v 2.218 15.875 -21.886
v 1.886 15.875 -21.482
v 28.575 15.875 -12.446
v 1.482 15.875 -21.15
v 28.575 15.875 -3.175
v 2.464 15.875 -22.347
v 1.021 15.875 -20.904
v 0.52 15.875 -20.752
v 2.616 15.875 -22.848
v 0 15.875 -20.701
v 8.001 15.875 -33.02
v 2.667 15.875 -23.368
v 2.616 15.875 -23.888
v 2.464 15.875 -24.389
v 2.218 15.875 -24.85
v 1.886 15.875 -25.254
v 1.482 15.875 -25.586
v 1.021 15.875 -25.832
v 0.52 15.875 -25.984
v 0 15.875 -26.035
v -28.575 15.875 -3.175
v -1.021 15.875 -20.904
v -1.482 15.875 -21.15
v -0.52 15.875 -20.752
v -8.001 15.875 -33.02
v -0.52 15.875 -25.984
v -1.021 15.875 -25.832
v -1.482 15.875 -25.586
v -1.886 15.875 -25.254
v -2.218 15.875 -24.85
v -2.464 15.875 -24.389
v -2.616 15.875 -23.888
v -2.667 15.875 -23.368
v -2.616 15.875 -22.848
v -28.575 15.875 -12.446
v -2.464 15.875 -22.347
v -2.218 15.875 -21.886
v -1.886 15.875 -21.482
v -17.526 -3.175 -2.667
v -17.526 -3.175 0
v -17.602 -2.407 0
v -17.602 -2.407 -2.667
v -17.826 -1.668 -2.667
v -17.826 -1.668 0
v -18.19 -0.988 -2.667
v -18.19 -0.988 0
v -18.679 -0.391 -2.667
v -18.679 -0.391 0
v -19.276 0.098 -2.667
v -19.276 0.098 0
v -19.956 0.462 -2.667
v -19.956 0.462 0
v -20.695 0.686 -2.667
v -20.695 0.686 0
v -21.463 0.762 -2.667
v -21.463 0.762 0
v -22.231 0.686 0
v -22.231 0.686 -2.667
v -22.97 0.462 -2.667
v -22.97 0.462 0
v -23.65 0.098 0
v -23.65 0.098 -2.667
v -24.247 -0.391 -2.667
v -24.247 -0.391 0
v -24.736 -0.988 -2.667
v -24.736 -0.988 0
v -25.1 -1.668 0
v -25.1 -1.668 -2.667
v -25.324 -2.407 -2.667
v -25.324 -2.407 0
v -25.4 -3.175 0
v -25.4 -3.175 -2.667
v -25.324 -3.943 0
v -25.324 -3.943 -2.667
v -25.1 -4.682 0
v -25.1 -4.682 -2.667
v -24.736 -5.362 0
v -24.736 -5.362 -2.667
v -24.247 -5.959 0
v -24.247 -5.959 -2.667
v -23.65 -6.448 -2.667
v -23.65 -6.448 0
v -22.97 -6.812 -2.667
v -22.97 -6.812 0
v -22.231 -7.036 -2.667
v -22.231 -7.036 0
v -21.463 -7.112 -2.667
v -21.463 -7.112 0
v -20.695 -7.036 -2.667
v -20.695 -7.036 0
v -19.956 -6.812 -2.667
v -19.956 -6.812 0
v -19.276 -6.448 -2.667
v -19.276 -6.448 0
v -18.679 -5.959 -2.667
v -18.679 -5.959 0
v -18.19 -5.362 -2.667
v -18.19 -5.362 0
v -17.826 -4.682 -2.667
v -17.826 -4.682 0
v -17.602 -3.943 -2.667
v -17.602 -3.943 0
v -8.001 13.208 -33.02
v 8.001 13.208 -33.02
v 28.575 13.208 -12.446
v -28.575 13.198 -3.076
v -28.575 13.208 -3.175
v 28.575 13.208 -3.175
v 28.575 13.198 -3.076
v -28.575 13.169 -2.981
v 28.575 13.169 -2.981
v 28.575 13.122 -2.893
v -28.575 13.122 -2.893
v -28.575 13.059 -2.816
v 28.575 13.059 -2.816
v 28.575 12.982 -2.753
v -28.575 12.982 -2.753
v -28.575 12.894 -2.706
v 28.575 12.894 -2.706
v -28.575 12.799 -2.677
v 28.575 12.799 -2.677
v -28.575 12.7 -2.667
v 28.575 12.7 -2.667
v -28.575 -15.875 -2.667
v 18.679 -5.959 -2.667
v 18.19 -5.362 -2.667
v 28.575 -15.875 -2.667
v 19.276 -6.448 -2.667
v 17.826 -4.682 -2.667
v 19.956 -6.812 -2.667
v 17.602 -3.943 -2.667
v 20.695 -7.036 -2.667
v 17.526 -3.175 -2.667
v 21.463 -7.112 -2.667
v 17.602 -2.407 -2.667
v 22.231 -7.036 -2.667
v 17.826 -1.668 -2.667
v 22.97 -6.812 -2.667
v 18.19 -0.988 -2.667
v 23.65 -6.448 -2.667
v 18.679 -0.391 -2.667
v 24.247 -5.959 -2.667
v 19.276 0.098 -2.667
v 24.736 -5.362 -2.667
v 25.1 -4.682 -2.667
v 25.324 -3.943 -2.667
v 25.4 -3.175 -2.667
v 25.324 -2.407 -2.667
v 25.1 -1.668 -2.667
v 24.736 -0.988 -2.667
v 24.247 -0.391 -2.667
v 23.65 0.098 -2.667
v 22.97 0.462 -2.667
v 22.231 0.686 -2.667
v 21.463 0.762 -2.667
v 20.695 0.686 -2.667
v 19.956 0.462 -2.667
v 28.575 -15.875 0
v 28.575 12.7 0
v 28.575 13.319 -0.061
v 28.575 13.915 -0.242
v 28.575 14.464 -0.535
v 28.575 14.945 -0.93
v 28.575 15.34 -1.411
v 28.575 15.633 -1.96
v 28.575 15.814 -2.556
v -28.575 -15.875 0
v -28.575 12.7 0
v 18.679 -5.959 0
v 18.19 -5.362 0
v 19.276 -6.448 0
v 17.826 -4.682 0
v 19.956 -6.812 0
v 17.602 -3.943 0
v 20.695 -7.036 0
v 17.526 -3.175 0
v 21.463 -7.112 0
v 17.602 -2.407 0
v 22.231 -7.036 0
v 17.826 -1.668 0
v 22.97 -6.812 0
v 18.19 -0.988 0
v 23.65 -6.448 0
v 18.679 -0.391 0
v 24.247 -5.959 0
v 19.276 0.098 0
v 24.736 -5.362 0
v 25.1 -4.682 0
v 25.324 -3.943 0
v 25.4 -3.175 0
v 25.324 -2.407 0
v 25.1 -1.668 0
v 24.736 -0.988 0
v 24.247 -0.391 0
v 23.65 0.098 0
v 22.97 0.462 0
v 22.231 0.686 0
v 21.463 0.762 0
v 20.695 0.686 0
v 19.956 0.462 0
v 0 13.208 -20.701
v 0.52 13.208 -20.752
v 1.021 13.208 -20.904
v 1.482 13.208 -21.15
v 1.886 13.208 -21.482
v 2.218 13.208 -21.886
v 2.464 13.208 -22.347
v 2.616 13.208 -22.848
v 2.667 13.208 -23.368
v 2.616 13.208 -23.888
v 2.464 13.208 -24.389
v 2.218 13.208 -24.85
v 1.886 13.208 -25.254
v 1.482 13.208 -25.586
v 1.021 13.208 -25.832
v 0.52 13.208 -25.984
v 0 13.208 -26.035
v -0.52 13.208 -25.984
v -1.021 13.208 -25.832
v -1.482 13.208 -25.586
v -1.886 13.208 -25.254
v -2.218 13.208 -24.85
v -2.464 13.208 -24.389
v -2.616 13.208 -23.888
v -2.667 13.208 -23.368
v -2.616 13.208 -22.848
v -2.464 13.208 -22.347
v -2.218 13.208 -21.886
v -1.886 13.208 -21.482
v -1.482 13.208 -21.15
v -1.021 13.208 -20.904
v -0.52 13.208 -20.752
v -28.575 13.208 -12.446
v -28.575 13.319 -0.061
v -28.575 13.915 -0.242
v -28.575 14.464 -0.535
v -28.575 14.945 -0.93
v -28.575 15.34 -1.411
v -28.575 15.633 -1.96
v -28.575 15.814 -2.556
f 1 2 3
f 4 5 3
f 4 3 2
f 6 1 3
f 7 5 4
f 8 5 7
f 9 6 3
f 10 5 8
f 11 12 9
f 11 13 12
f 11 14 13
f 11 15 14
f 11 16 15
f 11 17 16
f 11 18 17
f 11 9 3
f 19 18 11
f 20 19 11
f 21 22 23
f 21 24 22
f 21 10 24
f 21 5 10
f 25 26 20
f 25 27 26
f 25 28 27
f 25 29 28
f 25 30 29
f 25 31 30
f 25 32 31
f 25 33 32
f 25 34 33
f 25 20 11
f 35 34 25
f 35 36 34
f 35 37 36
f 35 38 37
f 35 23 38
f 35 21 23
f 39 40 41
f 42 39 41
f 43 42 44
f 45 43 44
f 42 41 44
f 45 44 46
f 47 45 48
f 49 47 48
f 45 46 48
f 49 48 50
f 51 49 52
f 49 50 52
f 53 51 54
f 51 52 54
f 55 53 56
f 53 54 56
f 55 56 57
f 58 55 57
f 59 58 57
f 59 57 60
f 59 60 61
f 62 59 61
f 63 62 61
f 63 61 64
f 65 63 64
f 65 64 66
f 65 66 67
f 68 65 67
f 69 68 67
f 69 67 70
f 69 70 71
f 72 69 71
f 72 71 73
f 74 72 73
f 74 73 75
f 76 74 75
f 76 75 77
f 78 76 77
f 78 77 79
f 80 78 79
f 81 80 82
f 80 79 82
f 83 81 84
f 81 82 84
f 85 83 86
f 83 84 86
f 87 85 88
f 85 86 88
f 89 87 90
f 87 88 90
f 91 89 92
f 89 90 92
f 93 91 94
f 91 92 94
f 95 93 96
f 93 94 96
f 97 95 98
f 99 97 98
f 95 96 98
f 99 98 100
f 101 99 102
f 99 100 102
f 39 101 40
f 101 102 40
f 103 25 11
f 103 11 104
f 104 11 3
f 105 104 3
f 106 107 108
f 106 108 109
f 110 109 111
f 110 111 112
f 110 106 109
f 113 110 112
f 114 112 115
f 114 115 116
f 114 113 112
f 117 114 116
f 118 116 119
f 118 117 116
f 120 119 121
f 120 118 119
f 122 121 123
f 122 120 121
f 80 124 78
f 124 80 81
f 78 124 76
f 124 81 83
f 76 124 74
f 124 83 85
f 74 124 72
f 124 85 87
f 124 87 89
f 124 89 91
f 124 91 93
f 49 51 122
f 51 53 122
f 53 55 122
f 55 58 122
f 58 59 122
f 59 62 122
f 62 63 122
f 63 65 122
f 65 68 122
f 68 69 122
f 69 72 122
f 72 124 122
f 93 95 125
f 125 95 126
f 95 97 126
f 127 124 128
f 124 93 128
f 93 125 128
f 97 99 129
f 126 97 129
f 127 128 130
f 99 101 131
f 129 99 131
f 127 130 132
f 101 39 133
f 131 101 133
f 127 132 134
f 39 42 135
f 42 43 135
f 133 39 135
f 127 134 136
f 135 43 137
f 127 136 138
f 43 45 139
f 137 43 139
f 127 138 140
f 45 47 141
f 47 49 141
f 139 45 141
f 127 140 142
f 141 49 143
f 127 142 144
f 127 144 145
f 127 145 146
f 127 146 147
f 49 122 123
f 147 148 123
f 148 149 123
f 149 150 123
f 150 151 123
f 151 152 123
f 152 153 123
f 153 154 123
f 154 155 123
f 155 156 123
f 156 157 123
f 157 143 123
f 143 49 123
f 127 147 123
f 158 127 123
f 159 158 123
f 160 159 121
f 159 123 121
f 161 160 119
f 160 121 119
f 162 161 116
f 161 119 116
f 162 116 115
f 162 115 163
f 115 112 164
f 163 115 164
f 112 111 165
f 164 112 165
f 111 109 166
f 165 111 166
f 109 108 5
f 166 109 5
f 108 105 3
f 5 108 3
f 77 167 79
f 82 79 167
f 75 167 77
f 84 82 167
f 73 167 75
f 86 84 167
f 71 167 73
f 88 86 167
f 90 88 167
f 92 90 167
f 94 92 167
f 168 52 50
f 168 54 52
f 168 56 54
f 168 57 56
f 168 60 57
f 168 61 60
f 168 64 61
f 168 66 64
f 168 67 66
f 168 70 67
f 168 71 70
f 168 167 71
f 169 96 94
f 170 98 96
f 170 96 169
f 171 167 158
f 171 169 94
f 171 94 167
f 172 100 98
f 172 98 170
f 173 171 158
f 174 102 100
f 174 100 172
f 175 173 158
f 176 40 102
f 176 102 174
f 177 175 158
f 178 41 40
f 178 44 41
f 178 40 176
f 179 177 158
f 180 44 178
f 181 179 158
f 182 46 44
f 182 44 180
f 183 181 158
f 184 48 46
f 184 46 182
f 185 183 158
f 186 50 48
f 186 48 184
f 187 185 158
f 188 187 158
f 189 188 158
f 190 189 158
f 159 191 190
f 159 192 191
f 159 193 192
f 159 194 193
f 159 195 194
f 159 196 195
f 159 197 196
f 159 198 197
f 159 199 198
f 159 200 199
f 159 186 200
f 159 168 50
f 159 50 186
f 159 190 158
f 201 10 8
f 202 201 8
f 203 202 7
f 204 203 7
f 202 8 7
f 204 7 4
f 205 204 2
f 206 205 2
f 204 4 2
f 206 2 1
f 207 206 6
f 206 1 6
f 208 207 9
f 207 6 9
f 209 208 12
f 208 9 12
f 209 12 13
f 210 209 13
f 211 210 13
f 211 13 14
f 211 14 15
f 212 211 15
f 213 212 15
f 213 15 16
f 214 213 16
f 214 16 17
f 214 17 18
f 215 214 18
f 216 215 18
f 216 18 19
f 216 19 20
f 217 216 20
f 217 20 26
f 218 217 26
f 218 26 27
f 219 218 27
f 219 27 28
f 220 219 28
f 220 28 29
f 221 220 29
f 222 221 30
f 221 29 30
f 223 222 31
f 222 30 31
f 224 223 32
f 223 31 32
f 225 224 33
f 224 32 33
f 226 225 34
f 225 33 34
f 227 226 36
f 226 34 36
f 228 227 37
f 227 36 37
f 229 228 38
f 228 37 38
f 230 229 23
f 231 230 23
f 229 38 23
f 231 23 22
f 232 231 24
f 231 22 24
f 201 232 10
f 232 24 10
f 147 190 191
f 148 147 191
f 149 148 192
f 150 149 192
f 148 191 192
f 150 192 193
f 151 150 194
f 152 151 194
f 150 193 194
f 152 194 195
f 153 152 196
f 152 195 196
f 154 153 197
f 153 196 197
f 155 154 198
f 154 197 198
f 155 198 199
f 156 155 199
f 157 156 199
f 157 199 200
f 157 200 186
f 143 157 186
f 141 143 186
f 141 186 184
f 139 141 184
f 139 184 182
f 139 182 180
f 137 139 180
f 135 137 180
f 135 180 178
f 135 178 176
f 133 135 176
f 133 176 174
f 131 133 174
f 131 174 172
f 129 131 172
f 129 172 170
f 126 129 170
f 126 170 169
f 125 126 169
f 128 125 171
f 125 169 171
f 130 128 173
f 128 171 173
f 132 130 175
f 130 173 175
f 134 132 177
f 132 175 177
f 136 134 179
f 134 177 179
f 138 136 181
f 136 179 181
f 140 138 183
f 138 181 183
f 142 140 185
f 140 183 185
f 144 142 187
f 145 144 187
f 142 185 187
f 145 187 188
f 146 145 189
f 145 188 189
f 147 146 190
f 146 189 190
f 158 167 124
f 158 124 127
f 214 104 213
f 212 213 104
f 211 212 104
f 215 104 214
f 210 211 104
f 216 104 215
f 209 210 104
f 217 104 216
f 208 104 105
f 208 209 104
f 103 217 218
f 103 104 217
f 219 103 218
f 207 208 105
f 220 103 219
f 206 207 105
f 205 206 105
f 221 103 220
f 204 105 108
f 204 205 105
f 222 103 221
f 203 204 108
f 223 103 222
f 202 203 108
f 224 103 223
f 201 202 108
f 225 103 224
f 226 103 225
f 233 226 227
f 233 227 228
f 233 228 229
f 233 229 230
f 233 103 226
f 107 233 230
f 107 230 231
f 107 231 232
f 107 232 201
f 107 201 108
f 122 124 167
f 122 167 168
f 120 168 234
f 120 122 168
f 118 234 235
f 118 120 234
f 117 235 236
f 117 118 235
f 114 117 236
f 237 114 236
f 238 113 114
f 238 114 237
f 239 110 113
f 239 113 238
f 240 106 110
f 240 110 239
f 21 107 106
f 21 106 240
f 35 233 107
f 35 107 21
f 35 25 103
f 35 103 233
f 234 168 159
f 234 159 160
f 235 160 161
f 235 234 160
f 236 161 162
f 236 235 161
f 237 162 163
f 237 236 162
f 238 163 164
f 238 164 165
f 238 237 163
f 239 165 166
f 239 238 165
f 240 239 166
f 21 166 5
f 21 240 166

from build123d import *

# Parameters (mm, degrees)
CROQUIS1_W                       = 57.15
CROQUIS1_H                       = 31.75
BRIDA_BASE1_DEPTH                = 2.667
BRIDA_DE_ARISTA1_STRIP_W         = 11.684
BRIDA_DE_ARISTA1_STRIP_H         = 2.667
BRIDA_DE_ARISTA1_STRIP_CUT_DEPTH = 57.15
BRIDA_DE_ARISTA1_DEPTH           = 57.15
CROQUIS9_R                       = 3.937
CORTAR_EXTRUIR1_DEPTH            = 5.588
CROQUIS10_R                      = 2.667
CORTAR_EXTRUIR2_DEPTH            = 5.588


# Sheet-metal steps are written as plain solids
with BuildPart() as part:
    # Croquis1 → Brida base1 (new body)
    with BuildSketch(Plane.XY):
        Rectangle(CROQUIS1_W, CROQUIS1_H)
    extrude(amount=-BRIDA_BASE1_DEPTH)

    # Brida de arista1 strip (across the edge) → Brida de arista1 strip cut (cut)
    with BuildSketch(Plane(origin=(-28.575, 15.875, -2.667), x_dir=(0, -1, 0), z_dir=(1, 0, 0))):
        with Locations((-2.667, -1.3335)):
            Rectangle(BRIDA_DE_ARISTA1_STRIP_W, BRIDA_DE_ARISTA1_STRIP_H)
    extrude(amount=BRIDA_DE_ARISTA1_STRIP_CUT_DEPTH, mode=Mode.SUBTRACT)

    # Brida de arista1 section (across the edge) → Brida de arista1 (add)
    with BuildSketch(Plane(origin=(-28.575, 15.875, -2.667), x_dir=(0, -1, 0), z_dir=(1, 0, 0))):
        with BuildLine():
            Line((0, 0.508), (0, 30.353))
            Line((0, 30.353), (2.667, 30.353))
            Line((2.667, 30.353), (2.667, 0.508))
            ThreePointArc((2.667, 0.508), (2.815789755, 0.148789755), (3.175, 0))
            Line((3.175, 0), (3.175, -2.667))
            ThreePointArc((3.175, -2.667), (0.92993597, -1.73706403), (0, 0.508))
        make_face()
    extrude(amount=BRIDA_DE_ARISTA1_DEPTH)

    # Croquis9 → Cortar-Extruir1 (cut)
    with BuildSketch(Plane.XY):
        with Locations((-21.463, -3.175)):
            Circle(CROQUIS9_R)
        with Locations((21.463, -3.175)):
            Circle(CROQUIS9_R)
    extrude(amount=-CORTAR_EXTRUIR1_DEPTH, mode=Mode.SUBTRACT)

    # Croquis10 → Cortar-Extruir2 (cut)
    with BuildSketch(Plane(origin=(0, 15.875, 0), x_dir=(1, 0, 0), z_dir=(0, 1, 0))):
        with Locations(Location((0, 23.368, 0), (0, 0, 270))):
            Circle(CROQUIS10_R)
        Polygon((-28.575, 33.02), (-8.001, 33.02), (-28.575, 12.446), align=None)
        Polygon((28.575, 33.02), (8.001, 33.02), (28.575, 12.446), align=None)
    extrude(amount=-CORTAR_EXTRUIR2_DEPTH, mode=Mode.SUBTRACT)


solid = part.part
